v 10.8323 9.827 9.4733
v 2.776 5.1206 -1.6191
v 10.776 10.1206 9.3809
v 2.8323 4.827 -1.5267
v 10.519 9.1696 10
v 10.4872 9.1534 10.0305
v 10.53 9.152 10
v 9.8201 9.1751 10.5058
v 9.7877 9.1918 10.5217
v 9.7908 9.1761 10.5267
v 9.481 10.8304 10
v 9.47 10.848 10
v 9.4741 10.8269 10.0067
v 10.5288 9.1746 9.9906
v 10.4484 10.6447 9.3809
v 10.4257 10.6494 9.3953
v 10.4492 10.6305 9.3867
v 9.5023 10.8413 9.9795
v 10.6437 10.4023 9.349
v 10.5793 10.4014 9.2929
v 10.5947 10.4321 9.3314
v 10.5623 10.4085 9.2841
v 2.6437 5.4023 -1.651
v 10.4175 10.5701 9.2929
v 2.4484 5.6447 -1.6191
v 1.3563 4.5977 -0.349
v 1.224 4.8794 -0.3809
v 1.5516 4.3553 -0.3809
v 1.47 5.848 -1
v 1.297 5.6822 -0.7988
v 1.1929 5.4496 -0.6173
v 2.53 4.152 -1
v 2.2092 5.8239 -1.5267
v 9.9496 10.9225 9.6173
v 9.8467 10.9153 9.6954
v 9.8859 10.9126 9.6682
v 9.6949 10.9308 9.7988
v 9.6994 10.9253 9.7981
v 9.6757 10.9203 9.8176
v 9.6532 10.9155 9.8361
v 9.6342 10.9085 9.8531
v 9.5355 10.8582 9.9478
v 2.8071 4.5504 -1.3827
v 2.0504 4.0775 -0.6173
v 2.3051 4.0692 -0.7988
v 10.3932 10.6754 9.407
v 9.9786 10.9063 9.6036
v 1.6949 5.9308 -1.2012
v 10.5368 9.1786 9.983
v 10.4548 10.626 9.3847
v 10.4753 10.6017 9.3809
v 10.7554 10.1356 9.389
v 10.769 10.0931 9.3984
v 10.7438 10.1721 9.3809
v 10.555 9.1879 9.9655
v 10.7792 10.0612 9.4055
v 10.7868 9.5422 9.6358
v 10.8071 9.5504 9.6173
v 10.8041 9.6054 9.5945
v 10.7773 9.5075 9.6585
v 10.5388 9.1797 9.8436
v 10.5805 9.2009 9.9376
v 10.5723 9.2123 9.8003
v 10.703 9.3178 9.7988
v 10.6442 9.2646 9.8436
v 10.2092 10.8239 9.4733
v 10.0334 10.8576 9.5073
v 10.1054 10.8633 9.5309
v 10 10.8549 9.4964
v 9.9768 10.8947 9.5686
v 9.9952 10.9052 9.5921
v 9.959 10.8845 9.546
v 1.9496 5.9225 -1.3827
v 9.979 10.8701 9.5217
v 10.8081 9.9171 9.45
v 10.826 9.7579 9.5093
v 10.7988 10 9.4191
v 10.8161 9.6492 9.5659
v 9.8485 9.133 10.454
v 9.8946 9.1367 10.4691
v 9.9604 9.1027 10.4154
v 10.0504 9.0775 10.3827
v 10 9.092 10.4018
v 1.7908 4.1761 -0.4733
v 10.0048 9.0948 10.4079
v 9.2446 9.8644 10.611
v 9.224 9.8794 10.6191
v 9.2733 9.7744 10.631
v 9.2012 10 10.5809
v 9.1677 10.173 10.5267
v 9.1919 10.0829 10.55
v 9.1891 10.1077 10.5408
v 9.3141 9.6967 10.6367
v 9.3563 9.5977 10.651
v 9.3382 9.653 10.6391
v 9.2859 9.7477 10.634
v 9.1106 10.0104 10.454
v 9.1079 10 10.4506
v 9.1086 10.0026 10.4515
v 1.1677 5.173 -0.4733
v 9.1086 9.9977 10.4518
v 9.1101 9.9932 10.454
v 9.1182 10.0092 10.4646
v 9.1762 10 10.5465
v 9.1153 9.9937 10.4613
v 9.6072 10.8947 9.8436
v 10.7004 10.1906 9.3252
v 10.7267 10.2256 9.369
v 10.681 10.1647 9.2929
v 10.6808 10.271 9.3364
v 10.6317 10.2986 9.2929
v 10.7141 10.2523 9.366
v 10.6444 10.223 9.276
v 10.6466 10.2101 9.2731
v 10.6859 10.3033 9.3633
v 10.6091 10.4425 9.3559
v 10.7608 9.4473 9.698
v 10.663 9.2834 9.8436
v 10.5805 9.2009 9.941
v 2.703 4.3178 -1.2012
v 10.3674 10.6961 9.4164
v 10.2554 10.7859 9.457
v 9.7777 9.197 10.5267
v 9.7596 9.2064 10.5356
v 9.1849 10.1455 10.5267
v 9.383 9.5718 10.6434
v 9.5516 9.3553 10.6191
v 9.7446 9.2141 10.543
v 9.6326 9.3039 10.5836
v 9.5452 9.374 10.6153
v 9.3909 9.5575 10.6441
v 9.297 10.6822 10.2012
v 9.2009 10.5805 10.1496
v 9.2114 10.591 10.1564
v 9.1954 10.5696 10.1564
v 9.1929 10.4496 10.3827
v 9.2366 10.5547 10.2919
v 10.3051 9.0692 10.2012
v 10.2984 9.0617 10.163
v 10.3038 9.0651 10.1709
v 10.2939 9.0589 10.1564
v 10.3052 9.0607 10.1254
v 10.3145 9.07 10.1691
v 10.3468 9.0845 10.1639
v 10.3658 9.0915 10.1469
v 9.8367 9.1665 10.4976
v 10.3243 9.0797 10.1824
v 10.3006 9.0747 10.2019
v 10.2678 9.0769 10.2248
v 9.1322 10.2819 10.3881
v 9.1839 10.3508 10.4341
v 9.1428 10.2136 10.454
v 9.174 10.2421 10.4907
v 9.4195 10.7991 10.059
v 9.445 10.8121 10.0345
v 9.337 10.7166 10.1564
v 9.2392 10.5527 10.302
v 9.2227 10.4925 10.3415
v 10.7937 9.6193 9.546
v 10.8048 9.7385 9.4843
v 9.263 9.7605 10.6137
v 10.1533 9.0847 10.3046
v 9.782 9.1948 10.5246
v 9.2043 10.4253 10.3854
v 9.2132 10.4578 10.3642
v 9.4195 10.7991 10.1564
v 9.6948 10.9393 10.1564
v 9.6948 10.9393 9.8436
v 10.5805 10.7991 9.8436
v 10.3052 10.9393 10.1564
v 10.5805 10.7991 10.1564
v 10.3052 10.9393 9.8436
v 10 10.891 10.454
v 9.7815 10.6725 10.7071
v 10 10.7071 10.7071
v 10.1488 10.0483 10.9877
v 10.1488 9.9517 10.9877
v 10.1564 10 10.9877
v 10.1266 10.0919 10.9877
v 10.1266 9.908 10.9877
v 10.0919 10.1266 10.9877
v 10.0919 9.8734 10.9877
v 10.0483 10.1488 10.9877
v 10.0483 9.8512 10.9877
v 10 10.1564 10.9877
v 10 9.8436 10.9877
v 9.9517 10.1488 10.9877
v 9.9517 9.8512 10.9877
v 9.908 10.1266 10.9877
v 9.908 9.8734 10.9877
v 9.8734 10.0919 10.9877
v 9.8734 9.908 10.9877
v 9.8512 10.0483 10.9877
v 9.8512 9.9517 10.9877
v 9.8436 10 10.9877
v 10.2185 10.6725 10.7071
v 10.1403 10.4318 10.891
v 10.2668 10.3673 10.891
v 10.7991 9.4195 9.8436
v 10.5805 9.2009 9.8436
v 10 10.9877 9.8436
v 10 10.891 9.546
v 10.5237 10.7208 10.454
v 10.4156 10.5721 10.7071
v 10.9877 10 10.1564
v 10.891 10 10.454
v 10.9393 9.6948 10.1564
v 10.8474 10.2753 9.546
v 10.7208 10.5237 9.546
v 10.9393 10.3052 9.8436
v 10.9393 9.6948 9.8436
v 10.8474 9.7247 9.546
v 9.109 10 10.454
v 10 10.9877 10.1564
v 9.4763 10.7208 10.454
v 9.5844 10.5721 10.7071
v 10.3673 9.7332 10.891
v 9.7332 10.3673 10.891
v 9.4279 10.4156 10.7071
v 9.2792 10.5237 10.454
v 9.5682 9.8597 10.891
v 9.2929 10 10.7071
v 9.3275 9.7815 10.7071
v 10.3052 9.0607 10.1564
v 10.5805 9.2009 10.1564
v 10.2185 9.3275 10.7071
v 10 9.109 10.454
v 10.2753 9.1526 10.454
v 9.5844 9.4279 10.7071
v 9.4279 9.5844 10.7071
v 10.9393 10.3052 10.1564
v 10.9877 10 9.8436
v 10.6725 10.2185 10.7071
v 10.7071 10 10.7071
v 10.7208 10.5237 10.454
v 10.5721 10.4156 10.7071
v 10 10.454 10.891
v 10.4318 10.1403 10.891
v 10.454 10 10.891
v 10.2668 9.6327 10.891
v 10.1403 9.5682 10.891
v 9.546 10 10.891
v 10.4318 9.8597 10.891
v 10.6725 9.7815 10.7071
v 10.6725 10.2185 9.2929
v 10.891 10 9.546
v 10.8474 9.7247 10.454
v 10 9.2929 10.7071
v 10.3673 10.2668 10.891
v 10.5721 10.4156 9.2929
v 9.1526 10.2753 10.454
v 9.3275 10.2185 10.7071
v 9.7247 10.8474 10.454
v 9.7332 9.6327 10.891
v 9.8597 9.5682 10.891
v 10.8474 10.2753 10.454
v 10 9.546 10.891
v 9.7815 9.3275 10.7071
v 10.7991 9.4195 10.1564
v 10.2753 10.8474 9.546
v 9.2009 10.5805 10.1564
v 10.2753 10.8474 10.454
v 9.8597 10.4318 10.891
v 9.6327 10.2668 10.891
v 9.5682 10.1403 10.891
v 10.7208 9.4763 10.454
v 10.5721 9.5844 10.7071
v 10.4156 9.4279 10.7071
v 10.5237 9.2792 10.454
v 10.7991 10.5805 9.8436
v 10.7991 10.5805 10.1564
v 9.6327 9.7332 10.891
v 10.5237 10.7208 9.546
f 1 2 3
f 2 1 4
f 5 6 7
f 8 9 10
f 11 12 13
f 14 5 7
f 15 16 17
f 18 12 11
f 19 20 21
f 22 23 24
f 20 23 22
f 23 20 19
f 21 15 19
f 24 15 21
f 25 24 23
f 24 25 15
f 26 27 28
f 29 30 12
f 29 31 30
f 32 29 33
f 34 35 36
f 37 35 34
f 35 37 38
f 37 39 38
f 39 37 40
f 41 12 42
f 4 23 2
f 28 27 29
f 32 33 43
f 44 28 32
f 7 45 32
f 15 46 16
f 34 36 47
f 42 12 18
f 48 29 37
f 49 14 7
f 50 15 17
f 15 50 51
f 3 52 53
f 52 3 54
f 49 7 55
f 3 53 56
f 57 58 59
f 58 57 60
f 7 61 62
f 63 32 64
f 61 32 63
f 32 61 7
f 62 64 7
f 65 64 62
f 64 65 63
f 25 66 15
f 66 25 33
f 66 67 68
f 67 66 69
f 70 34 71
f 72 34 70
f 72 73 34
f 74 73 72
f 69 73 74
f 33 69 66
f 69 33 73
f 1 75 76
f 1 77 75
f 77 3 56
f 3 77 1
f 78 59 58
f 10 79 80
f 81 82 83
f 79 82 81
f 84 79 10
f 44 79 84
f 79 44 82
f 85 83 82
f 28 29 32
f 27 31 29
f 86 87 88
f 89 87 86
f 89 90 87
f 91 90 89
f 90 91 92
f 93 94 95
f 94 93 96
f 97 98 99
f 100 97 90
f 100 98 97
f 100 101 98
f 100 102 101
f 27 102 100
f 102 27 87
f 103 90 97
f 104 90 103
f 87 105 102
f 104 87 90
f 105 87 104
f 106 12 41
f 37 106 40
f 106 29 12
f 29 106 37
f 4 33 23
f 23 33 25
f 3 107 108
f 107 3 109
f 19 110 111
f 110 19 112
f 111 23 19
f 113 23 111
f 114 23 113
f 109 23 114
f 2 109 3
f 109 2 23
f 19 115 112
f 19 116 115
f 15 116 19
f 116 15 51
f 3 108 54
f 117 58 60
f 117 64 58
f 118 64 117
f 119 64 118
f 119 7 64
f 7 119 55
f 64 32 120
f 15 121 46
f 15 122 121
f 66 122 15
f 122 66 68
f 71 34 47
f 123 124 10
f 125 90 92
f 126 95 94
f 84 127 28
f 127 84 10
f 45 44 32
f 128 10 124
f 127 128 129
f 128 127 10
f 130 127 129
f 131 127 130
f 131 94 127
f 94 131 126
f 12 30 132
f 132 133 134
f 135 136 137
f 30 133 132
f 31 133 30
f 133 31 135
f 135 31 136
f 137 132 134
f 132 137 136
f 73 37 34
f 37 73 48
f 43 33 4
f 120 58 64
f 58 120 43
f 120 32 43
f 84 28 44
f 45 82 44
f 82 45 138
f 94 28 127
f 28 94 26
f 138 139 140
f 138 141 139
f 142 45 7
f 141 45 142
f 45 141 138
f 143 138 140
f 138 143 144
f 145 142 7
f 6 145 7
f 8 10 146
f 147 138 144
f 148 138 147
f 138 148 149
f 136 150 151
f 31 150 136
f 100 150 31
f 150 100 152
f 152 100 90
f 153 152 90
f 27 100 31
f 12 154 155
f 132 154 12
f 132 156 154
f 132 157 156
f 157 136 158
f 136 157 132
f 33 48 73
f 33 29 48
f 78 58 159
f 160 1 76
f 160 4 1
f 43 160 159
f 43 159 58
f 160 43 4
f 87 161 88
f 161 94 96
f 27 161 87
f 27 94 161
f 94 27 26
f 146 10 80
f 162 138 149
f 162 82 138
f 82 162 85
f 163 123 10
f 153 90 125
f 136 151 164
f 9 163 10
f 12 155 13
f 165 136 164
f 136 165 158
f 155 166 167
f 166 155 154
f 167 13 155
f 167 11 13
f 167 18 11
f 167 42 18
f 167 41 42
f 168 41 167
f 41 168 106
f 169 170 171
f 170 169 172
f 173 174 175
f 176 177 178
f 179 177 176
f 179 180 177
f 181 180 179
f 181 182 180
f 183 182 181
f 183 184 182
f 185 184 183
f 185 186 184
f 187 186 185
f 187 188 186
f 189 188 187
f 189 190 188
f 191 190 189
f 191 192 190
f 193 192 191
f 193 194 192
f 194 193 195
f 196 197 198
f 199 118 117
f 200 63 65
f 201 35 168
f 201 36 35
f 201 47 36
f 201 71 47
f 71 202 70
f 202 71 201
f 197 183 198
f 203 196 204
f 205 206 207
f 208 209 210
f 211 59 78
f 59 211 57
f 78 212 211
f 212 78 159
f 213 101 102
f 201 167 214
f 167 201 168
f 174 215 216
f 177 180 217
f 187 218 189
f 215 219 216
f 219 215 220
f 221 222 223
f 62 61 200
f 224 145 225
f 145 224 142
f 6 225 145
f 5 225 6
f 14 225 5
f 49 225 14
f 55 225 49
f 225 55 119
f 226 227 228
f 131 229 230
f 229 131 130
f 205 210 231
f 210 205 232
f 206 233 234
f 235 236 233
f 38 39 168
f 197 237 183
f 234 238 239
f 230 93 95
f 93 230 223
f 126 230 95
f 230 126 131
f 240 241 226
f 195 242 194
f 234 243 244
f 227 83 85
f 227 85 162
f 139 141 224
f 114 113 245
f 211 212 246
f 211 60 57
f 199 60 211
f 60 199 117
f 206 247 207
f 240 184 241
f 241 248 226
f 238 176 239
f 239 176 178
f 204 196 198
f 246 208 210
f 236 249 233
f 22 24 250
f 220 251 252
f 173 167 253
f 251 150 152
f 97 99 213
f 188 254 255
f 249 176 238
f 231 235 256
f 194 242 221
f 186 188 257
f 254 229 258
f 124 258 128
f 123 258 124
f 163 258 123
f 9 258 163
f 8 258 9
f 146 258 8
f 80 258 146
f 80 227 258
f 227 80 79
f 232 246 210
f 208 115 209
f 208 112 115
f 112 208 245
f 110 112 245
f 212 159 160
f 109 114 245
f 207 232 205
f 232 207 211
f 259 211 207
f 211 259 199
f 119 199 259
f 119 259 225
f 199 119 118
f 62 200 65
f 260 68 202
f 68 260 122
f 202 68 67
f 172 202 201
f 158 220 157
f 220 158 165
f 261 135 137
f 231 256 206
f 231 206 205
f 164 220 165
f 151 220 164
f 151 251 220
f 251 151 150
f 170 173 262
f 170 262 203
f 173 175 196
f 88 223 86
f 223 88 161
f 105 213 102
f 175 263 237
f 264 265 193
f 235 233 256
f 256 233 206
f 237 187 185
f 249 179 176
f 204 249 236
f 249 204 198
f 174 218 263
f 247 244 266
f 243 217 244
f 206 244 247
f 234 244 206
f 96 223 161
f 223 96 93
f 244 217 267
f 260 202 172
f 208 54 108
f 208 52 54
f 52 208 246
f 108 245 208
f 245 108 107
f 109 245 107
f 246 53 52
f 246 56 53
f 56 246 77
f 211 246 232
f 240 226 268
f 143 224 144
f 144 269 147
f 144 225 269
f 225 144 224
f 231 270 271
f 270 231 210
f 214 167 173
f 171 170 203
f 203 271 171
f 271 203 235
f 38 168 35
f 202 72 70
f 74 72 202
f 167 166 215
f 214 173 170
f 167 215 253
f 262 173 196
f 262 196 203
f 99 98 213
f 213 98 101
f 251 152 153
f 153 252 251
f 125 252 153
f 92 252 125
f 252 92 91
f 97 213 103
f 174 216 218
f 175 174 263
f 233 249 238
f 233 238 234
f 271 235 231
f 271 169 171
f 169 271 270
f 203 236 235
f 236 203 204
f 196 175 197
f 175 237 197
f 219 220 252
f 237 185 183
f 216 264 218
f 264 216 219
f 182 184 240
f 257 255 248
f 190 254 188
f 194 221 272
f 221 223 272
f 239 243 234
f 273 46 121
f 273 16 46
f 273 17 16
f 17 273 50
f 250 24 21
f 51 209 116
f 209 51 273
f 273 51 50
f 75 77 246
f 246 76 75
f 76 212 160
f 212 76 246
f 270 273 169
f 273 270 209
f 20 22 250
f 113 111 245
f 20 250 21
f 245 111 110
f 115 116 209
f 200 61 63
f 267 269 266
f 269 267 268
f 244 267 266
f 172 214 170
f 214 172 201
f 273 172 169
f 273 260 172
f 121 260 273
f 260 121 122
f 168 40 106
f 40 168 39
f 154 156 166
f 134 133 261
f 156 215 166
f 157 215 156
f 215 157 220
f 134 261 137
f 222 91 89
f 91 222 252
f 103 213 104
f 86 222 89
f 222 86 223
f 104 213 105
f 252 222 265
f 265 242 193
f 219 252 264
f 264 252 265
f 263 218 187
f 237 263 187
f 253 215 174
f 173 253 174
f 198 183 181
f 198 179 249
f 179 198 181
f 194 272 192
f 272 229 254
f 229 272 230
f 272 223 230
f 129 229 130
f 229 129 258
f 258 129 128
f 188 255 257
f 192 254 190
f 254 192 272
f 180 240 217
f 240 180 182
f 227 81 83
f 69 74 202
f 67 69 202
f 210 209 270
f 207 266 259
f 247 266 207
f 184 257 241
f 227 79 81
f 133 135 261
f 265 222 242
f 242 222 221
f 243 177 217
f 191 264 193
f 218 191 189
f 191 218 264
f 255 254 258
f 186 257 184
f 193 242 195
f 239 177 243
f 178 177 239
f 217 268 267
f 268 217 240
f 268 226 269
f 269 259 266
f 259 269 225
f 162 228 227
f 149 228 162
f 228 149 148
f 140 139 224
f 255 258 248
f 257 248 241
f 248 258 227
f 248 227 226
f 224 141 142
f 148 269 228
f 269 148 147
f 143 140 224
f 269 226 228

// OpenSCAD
module cylinder_from_to(from, to, d=undef, r=undef) {
    height=sqrt((to.x-from.x)^2 + (to.y-from.y)^2 + (to.z-from.z)^2);
    // z rotation is simply looking down on the XY plane, but Y rotation
    // has to be relative to the plane parallel to the Z axis that both
    // from and to rest on, so the 'adjacent' distance for the arctan
    // is the 
    y_rot = atan2(sqrt((to.x-from.x)^2 + (to.y-from.y)^2), to.z-from.z);
    z_rot = atan2(to.y-from.y, to.x-from.x);
    echo(y_rot=y_rot, z_rot=z_rot);
    assert (d!=undef || r != undef, "Must define one of 'd' or 'r'");
    assert (!(d!=undef && r != undef), "Either define 'd' or 'r', not both");
    radius = (d == undef) ? d/2 : r;
    translate(from) rotate([0, y_rot, z_rot]) cylinder(r=radius, h=height);
}

$fn = 20;
cylinder_from_to([2, 5, -1], [10, 10, 10], d=2);
translate([10, 10, 10]) sphere(d=2);
